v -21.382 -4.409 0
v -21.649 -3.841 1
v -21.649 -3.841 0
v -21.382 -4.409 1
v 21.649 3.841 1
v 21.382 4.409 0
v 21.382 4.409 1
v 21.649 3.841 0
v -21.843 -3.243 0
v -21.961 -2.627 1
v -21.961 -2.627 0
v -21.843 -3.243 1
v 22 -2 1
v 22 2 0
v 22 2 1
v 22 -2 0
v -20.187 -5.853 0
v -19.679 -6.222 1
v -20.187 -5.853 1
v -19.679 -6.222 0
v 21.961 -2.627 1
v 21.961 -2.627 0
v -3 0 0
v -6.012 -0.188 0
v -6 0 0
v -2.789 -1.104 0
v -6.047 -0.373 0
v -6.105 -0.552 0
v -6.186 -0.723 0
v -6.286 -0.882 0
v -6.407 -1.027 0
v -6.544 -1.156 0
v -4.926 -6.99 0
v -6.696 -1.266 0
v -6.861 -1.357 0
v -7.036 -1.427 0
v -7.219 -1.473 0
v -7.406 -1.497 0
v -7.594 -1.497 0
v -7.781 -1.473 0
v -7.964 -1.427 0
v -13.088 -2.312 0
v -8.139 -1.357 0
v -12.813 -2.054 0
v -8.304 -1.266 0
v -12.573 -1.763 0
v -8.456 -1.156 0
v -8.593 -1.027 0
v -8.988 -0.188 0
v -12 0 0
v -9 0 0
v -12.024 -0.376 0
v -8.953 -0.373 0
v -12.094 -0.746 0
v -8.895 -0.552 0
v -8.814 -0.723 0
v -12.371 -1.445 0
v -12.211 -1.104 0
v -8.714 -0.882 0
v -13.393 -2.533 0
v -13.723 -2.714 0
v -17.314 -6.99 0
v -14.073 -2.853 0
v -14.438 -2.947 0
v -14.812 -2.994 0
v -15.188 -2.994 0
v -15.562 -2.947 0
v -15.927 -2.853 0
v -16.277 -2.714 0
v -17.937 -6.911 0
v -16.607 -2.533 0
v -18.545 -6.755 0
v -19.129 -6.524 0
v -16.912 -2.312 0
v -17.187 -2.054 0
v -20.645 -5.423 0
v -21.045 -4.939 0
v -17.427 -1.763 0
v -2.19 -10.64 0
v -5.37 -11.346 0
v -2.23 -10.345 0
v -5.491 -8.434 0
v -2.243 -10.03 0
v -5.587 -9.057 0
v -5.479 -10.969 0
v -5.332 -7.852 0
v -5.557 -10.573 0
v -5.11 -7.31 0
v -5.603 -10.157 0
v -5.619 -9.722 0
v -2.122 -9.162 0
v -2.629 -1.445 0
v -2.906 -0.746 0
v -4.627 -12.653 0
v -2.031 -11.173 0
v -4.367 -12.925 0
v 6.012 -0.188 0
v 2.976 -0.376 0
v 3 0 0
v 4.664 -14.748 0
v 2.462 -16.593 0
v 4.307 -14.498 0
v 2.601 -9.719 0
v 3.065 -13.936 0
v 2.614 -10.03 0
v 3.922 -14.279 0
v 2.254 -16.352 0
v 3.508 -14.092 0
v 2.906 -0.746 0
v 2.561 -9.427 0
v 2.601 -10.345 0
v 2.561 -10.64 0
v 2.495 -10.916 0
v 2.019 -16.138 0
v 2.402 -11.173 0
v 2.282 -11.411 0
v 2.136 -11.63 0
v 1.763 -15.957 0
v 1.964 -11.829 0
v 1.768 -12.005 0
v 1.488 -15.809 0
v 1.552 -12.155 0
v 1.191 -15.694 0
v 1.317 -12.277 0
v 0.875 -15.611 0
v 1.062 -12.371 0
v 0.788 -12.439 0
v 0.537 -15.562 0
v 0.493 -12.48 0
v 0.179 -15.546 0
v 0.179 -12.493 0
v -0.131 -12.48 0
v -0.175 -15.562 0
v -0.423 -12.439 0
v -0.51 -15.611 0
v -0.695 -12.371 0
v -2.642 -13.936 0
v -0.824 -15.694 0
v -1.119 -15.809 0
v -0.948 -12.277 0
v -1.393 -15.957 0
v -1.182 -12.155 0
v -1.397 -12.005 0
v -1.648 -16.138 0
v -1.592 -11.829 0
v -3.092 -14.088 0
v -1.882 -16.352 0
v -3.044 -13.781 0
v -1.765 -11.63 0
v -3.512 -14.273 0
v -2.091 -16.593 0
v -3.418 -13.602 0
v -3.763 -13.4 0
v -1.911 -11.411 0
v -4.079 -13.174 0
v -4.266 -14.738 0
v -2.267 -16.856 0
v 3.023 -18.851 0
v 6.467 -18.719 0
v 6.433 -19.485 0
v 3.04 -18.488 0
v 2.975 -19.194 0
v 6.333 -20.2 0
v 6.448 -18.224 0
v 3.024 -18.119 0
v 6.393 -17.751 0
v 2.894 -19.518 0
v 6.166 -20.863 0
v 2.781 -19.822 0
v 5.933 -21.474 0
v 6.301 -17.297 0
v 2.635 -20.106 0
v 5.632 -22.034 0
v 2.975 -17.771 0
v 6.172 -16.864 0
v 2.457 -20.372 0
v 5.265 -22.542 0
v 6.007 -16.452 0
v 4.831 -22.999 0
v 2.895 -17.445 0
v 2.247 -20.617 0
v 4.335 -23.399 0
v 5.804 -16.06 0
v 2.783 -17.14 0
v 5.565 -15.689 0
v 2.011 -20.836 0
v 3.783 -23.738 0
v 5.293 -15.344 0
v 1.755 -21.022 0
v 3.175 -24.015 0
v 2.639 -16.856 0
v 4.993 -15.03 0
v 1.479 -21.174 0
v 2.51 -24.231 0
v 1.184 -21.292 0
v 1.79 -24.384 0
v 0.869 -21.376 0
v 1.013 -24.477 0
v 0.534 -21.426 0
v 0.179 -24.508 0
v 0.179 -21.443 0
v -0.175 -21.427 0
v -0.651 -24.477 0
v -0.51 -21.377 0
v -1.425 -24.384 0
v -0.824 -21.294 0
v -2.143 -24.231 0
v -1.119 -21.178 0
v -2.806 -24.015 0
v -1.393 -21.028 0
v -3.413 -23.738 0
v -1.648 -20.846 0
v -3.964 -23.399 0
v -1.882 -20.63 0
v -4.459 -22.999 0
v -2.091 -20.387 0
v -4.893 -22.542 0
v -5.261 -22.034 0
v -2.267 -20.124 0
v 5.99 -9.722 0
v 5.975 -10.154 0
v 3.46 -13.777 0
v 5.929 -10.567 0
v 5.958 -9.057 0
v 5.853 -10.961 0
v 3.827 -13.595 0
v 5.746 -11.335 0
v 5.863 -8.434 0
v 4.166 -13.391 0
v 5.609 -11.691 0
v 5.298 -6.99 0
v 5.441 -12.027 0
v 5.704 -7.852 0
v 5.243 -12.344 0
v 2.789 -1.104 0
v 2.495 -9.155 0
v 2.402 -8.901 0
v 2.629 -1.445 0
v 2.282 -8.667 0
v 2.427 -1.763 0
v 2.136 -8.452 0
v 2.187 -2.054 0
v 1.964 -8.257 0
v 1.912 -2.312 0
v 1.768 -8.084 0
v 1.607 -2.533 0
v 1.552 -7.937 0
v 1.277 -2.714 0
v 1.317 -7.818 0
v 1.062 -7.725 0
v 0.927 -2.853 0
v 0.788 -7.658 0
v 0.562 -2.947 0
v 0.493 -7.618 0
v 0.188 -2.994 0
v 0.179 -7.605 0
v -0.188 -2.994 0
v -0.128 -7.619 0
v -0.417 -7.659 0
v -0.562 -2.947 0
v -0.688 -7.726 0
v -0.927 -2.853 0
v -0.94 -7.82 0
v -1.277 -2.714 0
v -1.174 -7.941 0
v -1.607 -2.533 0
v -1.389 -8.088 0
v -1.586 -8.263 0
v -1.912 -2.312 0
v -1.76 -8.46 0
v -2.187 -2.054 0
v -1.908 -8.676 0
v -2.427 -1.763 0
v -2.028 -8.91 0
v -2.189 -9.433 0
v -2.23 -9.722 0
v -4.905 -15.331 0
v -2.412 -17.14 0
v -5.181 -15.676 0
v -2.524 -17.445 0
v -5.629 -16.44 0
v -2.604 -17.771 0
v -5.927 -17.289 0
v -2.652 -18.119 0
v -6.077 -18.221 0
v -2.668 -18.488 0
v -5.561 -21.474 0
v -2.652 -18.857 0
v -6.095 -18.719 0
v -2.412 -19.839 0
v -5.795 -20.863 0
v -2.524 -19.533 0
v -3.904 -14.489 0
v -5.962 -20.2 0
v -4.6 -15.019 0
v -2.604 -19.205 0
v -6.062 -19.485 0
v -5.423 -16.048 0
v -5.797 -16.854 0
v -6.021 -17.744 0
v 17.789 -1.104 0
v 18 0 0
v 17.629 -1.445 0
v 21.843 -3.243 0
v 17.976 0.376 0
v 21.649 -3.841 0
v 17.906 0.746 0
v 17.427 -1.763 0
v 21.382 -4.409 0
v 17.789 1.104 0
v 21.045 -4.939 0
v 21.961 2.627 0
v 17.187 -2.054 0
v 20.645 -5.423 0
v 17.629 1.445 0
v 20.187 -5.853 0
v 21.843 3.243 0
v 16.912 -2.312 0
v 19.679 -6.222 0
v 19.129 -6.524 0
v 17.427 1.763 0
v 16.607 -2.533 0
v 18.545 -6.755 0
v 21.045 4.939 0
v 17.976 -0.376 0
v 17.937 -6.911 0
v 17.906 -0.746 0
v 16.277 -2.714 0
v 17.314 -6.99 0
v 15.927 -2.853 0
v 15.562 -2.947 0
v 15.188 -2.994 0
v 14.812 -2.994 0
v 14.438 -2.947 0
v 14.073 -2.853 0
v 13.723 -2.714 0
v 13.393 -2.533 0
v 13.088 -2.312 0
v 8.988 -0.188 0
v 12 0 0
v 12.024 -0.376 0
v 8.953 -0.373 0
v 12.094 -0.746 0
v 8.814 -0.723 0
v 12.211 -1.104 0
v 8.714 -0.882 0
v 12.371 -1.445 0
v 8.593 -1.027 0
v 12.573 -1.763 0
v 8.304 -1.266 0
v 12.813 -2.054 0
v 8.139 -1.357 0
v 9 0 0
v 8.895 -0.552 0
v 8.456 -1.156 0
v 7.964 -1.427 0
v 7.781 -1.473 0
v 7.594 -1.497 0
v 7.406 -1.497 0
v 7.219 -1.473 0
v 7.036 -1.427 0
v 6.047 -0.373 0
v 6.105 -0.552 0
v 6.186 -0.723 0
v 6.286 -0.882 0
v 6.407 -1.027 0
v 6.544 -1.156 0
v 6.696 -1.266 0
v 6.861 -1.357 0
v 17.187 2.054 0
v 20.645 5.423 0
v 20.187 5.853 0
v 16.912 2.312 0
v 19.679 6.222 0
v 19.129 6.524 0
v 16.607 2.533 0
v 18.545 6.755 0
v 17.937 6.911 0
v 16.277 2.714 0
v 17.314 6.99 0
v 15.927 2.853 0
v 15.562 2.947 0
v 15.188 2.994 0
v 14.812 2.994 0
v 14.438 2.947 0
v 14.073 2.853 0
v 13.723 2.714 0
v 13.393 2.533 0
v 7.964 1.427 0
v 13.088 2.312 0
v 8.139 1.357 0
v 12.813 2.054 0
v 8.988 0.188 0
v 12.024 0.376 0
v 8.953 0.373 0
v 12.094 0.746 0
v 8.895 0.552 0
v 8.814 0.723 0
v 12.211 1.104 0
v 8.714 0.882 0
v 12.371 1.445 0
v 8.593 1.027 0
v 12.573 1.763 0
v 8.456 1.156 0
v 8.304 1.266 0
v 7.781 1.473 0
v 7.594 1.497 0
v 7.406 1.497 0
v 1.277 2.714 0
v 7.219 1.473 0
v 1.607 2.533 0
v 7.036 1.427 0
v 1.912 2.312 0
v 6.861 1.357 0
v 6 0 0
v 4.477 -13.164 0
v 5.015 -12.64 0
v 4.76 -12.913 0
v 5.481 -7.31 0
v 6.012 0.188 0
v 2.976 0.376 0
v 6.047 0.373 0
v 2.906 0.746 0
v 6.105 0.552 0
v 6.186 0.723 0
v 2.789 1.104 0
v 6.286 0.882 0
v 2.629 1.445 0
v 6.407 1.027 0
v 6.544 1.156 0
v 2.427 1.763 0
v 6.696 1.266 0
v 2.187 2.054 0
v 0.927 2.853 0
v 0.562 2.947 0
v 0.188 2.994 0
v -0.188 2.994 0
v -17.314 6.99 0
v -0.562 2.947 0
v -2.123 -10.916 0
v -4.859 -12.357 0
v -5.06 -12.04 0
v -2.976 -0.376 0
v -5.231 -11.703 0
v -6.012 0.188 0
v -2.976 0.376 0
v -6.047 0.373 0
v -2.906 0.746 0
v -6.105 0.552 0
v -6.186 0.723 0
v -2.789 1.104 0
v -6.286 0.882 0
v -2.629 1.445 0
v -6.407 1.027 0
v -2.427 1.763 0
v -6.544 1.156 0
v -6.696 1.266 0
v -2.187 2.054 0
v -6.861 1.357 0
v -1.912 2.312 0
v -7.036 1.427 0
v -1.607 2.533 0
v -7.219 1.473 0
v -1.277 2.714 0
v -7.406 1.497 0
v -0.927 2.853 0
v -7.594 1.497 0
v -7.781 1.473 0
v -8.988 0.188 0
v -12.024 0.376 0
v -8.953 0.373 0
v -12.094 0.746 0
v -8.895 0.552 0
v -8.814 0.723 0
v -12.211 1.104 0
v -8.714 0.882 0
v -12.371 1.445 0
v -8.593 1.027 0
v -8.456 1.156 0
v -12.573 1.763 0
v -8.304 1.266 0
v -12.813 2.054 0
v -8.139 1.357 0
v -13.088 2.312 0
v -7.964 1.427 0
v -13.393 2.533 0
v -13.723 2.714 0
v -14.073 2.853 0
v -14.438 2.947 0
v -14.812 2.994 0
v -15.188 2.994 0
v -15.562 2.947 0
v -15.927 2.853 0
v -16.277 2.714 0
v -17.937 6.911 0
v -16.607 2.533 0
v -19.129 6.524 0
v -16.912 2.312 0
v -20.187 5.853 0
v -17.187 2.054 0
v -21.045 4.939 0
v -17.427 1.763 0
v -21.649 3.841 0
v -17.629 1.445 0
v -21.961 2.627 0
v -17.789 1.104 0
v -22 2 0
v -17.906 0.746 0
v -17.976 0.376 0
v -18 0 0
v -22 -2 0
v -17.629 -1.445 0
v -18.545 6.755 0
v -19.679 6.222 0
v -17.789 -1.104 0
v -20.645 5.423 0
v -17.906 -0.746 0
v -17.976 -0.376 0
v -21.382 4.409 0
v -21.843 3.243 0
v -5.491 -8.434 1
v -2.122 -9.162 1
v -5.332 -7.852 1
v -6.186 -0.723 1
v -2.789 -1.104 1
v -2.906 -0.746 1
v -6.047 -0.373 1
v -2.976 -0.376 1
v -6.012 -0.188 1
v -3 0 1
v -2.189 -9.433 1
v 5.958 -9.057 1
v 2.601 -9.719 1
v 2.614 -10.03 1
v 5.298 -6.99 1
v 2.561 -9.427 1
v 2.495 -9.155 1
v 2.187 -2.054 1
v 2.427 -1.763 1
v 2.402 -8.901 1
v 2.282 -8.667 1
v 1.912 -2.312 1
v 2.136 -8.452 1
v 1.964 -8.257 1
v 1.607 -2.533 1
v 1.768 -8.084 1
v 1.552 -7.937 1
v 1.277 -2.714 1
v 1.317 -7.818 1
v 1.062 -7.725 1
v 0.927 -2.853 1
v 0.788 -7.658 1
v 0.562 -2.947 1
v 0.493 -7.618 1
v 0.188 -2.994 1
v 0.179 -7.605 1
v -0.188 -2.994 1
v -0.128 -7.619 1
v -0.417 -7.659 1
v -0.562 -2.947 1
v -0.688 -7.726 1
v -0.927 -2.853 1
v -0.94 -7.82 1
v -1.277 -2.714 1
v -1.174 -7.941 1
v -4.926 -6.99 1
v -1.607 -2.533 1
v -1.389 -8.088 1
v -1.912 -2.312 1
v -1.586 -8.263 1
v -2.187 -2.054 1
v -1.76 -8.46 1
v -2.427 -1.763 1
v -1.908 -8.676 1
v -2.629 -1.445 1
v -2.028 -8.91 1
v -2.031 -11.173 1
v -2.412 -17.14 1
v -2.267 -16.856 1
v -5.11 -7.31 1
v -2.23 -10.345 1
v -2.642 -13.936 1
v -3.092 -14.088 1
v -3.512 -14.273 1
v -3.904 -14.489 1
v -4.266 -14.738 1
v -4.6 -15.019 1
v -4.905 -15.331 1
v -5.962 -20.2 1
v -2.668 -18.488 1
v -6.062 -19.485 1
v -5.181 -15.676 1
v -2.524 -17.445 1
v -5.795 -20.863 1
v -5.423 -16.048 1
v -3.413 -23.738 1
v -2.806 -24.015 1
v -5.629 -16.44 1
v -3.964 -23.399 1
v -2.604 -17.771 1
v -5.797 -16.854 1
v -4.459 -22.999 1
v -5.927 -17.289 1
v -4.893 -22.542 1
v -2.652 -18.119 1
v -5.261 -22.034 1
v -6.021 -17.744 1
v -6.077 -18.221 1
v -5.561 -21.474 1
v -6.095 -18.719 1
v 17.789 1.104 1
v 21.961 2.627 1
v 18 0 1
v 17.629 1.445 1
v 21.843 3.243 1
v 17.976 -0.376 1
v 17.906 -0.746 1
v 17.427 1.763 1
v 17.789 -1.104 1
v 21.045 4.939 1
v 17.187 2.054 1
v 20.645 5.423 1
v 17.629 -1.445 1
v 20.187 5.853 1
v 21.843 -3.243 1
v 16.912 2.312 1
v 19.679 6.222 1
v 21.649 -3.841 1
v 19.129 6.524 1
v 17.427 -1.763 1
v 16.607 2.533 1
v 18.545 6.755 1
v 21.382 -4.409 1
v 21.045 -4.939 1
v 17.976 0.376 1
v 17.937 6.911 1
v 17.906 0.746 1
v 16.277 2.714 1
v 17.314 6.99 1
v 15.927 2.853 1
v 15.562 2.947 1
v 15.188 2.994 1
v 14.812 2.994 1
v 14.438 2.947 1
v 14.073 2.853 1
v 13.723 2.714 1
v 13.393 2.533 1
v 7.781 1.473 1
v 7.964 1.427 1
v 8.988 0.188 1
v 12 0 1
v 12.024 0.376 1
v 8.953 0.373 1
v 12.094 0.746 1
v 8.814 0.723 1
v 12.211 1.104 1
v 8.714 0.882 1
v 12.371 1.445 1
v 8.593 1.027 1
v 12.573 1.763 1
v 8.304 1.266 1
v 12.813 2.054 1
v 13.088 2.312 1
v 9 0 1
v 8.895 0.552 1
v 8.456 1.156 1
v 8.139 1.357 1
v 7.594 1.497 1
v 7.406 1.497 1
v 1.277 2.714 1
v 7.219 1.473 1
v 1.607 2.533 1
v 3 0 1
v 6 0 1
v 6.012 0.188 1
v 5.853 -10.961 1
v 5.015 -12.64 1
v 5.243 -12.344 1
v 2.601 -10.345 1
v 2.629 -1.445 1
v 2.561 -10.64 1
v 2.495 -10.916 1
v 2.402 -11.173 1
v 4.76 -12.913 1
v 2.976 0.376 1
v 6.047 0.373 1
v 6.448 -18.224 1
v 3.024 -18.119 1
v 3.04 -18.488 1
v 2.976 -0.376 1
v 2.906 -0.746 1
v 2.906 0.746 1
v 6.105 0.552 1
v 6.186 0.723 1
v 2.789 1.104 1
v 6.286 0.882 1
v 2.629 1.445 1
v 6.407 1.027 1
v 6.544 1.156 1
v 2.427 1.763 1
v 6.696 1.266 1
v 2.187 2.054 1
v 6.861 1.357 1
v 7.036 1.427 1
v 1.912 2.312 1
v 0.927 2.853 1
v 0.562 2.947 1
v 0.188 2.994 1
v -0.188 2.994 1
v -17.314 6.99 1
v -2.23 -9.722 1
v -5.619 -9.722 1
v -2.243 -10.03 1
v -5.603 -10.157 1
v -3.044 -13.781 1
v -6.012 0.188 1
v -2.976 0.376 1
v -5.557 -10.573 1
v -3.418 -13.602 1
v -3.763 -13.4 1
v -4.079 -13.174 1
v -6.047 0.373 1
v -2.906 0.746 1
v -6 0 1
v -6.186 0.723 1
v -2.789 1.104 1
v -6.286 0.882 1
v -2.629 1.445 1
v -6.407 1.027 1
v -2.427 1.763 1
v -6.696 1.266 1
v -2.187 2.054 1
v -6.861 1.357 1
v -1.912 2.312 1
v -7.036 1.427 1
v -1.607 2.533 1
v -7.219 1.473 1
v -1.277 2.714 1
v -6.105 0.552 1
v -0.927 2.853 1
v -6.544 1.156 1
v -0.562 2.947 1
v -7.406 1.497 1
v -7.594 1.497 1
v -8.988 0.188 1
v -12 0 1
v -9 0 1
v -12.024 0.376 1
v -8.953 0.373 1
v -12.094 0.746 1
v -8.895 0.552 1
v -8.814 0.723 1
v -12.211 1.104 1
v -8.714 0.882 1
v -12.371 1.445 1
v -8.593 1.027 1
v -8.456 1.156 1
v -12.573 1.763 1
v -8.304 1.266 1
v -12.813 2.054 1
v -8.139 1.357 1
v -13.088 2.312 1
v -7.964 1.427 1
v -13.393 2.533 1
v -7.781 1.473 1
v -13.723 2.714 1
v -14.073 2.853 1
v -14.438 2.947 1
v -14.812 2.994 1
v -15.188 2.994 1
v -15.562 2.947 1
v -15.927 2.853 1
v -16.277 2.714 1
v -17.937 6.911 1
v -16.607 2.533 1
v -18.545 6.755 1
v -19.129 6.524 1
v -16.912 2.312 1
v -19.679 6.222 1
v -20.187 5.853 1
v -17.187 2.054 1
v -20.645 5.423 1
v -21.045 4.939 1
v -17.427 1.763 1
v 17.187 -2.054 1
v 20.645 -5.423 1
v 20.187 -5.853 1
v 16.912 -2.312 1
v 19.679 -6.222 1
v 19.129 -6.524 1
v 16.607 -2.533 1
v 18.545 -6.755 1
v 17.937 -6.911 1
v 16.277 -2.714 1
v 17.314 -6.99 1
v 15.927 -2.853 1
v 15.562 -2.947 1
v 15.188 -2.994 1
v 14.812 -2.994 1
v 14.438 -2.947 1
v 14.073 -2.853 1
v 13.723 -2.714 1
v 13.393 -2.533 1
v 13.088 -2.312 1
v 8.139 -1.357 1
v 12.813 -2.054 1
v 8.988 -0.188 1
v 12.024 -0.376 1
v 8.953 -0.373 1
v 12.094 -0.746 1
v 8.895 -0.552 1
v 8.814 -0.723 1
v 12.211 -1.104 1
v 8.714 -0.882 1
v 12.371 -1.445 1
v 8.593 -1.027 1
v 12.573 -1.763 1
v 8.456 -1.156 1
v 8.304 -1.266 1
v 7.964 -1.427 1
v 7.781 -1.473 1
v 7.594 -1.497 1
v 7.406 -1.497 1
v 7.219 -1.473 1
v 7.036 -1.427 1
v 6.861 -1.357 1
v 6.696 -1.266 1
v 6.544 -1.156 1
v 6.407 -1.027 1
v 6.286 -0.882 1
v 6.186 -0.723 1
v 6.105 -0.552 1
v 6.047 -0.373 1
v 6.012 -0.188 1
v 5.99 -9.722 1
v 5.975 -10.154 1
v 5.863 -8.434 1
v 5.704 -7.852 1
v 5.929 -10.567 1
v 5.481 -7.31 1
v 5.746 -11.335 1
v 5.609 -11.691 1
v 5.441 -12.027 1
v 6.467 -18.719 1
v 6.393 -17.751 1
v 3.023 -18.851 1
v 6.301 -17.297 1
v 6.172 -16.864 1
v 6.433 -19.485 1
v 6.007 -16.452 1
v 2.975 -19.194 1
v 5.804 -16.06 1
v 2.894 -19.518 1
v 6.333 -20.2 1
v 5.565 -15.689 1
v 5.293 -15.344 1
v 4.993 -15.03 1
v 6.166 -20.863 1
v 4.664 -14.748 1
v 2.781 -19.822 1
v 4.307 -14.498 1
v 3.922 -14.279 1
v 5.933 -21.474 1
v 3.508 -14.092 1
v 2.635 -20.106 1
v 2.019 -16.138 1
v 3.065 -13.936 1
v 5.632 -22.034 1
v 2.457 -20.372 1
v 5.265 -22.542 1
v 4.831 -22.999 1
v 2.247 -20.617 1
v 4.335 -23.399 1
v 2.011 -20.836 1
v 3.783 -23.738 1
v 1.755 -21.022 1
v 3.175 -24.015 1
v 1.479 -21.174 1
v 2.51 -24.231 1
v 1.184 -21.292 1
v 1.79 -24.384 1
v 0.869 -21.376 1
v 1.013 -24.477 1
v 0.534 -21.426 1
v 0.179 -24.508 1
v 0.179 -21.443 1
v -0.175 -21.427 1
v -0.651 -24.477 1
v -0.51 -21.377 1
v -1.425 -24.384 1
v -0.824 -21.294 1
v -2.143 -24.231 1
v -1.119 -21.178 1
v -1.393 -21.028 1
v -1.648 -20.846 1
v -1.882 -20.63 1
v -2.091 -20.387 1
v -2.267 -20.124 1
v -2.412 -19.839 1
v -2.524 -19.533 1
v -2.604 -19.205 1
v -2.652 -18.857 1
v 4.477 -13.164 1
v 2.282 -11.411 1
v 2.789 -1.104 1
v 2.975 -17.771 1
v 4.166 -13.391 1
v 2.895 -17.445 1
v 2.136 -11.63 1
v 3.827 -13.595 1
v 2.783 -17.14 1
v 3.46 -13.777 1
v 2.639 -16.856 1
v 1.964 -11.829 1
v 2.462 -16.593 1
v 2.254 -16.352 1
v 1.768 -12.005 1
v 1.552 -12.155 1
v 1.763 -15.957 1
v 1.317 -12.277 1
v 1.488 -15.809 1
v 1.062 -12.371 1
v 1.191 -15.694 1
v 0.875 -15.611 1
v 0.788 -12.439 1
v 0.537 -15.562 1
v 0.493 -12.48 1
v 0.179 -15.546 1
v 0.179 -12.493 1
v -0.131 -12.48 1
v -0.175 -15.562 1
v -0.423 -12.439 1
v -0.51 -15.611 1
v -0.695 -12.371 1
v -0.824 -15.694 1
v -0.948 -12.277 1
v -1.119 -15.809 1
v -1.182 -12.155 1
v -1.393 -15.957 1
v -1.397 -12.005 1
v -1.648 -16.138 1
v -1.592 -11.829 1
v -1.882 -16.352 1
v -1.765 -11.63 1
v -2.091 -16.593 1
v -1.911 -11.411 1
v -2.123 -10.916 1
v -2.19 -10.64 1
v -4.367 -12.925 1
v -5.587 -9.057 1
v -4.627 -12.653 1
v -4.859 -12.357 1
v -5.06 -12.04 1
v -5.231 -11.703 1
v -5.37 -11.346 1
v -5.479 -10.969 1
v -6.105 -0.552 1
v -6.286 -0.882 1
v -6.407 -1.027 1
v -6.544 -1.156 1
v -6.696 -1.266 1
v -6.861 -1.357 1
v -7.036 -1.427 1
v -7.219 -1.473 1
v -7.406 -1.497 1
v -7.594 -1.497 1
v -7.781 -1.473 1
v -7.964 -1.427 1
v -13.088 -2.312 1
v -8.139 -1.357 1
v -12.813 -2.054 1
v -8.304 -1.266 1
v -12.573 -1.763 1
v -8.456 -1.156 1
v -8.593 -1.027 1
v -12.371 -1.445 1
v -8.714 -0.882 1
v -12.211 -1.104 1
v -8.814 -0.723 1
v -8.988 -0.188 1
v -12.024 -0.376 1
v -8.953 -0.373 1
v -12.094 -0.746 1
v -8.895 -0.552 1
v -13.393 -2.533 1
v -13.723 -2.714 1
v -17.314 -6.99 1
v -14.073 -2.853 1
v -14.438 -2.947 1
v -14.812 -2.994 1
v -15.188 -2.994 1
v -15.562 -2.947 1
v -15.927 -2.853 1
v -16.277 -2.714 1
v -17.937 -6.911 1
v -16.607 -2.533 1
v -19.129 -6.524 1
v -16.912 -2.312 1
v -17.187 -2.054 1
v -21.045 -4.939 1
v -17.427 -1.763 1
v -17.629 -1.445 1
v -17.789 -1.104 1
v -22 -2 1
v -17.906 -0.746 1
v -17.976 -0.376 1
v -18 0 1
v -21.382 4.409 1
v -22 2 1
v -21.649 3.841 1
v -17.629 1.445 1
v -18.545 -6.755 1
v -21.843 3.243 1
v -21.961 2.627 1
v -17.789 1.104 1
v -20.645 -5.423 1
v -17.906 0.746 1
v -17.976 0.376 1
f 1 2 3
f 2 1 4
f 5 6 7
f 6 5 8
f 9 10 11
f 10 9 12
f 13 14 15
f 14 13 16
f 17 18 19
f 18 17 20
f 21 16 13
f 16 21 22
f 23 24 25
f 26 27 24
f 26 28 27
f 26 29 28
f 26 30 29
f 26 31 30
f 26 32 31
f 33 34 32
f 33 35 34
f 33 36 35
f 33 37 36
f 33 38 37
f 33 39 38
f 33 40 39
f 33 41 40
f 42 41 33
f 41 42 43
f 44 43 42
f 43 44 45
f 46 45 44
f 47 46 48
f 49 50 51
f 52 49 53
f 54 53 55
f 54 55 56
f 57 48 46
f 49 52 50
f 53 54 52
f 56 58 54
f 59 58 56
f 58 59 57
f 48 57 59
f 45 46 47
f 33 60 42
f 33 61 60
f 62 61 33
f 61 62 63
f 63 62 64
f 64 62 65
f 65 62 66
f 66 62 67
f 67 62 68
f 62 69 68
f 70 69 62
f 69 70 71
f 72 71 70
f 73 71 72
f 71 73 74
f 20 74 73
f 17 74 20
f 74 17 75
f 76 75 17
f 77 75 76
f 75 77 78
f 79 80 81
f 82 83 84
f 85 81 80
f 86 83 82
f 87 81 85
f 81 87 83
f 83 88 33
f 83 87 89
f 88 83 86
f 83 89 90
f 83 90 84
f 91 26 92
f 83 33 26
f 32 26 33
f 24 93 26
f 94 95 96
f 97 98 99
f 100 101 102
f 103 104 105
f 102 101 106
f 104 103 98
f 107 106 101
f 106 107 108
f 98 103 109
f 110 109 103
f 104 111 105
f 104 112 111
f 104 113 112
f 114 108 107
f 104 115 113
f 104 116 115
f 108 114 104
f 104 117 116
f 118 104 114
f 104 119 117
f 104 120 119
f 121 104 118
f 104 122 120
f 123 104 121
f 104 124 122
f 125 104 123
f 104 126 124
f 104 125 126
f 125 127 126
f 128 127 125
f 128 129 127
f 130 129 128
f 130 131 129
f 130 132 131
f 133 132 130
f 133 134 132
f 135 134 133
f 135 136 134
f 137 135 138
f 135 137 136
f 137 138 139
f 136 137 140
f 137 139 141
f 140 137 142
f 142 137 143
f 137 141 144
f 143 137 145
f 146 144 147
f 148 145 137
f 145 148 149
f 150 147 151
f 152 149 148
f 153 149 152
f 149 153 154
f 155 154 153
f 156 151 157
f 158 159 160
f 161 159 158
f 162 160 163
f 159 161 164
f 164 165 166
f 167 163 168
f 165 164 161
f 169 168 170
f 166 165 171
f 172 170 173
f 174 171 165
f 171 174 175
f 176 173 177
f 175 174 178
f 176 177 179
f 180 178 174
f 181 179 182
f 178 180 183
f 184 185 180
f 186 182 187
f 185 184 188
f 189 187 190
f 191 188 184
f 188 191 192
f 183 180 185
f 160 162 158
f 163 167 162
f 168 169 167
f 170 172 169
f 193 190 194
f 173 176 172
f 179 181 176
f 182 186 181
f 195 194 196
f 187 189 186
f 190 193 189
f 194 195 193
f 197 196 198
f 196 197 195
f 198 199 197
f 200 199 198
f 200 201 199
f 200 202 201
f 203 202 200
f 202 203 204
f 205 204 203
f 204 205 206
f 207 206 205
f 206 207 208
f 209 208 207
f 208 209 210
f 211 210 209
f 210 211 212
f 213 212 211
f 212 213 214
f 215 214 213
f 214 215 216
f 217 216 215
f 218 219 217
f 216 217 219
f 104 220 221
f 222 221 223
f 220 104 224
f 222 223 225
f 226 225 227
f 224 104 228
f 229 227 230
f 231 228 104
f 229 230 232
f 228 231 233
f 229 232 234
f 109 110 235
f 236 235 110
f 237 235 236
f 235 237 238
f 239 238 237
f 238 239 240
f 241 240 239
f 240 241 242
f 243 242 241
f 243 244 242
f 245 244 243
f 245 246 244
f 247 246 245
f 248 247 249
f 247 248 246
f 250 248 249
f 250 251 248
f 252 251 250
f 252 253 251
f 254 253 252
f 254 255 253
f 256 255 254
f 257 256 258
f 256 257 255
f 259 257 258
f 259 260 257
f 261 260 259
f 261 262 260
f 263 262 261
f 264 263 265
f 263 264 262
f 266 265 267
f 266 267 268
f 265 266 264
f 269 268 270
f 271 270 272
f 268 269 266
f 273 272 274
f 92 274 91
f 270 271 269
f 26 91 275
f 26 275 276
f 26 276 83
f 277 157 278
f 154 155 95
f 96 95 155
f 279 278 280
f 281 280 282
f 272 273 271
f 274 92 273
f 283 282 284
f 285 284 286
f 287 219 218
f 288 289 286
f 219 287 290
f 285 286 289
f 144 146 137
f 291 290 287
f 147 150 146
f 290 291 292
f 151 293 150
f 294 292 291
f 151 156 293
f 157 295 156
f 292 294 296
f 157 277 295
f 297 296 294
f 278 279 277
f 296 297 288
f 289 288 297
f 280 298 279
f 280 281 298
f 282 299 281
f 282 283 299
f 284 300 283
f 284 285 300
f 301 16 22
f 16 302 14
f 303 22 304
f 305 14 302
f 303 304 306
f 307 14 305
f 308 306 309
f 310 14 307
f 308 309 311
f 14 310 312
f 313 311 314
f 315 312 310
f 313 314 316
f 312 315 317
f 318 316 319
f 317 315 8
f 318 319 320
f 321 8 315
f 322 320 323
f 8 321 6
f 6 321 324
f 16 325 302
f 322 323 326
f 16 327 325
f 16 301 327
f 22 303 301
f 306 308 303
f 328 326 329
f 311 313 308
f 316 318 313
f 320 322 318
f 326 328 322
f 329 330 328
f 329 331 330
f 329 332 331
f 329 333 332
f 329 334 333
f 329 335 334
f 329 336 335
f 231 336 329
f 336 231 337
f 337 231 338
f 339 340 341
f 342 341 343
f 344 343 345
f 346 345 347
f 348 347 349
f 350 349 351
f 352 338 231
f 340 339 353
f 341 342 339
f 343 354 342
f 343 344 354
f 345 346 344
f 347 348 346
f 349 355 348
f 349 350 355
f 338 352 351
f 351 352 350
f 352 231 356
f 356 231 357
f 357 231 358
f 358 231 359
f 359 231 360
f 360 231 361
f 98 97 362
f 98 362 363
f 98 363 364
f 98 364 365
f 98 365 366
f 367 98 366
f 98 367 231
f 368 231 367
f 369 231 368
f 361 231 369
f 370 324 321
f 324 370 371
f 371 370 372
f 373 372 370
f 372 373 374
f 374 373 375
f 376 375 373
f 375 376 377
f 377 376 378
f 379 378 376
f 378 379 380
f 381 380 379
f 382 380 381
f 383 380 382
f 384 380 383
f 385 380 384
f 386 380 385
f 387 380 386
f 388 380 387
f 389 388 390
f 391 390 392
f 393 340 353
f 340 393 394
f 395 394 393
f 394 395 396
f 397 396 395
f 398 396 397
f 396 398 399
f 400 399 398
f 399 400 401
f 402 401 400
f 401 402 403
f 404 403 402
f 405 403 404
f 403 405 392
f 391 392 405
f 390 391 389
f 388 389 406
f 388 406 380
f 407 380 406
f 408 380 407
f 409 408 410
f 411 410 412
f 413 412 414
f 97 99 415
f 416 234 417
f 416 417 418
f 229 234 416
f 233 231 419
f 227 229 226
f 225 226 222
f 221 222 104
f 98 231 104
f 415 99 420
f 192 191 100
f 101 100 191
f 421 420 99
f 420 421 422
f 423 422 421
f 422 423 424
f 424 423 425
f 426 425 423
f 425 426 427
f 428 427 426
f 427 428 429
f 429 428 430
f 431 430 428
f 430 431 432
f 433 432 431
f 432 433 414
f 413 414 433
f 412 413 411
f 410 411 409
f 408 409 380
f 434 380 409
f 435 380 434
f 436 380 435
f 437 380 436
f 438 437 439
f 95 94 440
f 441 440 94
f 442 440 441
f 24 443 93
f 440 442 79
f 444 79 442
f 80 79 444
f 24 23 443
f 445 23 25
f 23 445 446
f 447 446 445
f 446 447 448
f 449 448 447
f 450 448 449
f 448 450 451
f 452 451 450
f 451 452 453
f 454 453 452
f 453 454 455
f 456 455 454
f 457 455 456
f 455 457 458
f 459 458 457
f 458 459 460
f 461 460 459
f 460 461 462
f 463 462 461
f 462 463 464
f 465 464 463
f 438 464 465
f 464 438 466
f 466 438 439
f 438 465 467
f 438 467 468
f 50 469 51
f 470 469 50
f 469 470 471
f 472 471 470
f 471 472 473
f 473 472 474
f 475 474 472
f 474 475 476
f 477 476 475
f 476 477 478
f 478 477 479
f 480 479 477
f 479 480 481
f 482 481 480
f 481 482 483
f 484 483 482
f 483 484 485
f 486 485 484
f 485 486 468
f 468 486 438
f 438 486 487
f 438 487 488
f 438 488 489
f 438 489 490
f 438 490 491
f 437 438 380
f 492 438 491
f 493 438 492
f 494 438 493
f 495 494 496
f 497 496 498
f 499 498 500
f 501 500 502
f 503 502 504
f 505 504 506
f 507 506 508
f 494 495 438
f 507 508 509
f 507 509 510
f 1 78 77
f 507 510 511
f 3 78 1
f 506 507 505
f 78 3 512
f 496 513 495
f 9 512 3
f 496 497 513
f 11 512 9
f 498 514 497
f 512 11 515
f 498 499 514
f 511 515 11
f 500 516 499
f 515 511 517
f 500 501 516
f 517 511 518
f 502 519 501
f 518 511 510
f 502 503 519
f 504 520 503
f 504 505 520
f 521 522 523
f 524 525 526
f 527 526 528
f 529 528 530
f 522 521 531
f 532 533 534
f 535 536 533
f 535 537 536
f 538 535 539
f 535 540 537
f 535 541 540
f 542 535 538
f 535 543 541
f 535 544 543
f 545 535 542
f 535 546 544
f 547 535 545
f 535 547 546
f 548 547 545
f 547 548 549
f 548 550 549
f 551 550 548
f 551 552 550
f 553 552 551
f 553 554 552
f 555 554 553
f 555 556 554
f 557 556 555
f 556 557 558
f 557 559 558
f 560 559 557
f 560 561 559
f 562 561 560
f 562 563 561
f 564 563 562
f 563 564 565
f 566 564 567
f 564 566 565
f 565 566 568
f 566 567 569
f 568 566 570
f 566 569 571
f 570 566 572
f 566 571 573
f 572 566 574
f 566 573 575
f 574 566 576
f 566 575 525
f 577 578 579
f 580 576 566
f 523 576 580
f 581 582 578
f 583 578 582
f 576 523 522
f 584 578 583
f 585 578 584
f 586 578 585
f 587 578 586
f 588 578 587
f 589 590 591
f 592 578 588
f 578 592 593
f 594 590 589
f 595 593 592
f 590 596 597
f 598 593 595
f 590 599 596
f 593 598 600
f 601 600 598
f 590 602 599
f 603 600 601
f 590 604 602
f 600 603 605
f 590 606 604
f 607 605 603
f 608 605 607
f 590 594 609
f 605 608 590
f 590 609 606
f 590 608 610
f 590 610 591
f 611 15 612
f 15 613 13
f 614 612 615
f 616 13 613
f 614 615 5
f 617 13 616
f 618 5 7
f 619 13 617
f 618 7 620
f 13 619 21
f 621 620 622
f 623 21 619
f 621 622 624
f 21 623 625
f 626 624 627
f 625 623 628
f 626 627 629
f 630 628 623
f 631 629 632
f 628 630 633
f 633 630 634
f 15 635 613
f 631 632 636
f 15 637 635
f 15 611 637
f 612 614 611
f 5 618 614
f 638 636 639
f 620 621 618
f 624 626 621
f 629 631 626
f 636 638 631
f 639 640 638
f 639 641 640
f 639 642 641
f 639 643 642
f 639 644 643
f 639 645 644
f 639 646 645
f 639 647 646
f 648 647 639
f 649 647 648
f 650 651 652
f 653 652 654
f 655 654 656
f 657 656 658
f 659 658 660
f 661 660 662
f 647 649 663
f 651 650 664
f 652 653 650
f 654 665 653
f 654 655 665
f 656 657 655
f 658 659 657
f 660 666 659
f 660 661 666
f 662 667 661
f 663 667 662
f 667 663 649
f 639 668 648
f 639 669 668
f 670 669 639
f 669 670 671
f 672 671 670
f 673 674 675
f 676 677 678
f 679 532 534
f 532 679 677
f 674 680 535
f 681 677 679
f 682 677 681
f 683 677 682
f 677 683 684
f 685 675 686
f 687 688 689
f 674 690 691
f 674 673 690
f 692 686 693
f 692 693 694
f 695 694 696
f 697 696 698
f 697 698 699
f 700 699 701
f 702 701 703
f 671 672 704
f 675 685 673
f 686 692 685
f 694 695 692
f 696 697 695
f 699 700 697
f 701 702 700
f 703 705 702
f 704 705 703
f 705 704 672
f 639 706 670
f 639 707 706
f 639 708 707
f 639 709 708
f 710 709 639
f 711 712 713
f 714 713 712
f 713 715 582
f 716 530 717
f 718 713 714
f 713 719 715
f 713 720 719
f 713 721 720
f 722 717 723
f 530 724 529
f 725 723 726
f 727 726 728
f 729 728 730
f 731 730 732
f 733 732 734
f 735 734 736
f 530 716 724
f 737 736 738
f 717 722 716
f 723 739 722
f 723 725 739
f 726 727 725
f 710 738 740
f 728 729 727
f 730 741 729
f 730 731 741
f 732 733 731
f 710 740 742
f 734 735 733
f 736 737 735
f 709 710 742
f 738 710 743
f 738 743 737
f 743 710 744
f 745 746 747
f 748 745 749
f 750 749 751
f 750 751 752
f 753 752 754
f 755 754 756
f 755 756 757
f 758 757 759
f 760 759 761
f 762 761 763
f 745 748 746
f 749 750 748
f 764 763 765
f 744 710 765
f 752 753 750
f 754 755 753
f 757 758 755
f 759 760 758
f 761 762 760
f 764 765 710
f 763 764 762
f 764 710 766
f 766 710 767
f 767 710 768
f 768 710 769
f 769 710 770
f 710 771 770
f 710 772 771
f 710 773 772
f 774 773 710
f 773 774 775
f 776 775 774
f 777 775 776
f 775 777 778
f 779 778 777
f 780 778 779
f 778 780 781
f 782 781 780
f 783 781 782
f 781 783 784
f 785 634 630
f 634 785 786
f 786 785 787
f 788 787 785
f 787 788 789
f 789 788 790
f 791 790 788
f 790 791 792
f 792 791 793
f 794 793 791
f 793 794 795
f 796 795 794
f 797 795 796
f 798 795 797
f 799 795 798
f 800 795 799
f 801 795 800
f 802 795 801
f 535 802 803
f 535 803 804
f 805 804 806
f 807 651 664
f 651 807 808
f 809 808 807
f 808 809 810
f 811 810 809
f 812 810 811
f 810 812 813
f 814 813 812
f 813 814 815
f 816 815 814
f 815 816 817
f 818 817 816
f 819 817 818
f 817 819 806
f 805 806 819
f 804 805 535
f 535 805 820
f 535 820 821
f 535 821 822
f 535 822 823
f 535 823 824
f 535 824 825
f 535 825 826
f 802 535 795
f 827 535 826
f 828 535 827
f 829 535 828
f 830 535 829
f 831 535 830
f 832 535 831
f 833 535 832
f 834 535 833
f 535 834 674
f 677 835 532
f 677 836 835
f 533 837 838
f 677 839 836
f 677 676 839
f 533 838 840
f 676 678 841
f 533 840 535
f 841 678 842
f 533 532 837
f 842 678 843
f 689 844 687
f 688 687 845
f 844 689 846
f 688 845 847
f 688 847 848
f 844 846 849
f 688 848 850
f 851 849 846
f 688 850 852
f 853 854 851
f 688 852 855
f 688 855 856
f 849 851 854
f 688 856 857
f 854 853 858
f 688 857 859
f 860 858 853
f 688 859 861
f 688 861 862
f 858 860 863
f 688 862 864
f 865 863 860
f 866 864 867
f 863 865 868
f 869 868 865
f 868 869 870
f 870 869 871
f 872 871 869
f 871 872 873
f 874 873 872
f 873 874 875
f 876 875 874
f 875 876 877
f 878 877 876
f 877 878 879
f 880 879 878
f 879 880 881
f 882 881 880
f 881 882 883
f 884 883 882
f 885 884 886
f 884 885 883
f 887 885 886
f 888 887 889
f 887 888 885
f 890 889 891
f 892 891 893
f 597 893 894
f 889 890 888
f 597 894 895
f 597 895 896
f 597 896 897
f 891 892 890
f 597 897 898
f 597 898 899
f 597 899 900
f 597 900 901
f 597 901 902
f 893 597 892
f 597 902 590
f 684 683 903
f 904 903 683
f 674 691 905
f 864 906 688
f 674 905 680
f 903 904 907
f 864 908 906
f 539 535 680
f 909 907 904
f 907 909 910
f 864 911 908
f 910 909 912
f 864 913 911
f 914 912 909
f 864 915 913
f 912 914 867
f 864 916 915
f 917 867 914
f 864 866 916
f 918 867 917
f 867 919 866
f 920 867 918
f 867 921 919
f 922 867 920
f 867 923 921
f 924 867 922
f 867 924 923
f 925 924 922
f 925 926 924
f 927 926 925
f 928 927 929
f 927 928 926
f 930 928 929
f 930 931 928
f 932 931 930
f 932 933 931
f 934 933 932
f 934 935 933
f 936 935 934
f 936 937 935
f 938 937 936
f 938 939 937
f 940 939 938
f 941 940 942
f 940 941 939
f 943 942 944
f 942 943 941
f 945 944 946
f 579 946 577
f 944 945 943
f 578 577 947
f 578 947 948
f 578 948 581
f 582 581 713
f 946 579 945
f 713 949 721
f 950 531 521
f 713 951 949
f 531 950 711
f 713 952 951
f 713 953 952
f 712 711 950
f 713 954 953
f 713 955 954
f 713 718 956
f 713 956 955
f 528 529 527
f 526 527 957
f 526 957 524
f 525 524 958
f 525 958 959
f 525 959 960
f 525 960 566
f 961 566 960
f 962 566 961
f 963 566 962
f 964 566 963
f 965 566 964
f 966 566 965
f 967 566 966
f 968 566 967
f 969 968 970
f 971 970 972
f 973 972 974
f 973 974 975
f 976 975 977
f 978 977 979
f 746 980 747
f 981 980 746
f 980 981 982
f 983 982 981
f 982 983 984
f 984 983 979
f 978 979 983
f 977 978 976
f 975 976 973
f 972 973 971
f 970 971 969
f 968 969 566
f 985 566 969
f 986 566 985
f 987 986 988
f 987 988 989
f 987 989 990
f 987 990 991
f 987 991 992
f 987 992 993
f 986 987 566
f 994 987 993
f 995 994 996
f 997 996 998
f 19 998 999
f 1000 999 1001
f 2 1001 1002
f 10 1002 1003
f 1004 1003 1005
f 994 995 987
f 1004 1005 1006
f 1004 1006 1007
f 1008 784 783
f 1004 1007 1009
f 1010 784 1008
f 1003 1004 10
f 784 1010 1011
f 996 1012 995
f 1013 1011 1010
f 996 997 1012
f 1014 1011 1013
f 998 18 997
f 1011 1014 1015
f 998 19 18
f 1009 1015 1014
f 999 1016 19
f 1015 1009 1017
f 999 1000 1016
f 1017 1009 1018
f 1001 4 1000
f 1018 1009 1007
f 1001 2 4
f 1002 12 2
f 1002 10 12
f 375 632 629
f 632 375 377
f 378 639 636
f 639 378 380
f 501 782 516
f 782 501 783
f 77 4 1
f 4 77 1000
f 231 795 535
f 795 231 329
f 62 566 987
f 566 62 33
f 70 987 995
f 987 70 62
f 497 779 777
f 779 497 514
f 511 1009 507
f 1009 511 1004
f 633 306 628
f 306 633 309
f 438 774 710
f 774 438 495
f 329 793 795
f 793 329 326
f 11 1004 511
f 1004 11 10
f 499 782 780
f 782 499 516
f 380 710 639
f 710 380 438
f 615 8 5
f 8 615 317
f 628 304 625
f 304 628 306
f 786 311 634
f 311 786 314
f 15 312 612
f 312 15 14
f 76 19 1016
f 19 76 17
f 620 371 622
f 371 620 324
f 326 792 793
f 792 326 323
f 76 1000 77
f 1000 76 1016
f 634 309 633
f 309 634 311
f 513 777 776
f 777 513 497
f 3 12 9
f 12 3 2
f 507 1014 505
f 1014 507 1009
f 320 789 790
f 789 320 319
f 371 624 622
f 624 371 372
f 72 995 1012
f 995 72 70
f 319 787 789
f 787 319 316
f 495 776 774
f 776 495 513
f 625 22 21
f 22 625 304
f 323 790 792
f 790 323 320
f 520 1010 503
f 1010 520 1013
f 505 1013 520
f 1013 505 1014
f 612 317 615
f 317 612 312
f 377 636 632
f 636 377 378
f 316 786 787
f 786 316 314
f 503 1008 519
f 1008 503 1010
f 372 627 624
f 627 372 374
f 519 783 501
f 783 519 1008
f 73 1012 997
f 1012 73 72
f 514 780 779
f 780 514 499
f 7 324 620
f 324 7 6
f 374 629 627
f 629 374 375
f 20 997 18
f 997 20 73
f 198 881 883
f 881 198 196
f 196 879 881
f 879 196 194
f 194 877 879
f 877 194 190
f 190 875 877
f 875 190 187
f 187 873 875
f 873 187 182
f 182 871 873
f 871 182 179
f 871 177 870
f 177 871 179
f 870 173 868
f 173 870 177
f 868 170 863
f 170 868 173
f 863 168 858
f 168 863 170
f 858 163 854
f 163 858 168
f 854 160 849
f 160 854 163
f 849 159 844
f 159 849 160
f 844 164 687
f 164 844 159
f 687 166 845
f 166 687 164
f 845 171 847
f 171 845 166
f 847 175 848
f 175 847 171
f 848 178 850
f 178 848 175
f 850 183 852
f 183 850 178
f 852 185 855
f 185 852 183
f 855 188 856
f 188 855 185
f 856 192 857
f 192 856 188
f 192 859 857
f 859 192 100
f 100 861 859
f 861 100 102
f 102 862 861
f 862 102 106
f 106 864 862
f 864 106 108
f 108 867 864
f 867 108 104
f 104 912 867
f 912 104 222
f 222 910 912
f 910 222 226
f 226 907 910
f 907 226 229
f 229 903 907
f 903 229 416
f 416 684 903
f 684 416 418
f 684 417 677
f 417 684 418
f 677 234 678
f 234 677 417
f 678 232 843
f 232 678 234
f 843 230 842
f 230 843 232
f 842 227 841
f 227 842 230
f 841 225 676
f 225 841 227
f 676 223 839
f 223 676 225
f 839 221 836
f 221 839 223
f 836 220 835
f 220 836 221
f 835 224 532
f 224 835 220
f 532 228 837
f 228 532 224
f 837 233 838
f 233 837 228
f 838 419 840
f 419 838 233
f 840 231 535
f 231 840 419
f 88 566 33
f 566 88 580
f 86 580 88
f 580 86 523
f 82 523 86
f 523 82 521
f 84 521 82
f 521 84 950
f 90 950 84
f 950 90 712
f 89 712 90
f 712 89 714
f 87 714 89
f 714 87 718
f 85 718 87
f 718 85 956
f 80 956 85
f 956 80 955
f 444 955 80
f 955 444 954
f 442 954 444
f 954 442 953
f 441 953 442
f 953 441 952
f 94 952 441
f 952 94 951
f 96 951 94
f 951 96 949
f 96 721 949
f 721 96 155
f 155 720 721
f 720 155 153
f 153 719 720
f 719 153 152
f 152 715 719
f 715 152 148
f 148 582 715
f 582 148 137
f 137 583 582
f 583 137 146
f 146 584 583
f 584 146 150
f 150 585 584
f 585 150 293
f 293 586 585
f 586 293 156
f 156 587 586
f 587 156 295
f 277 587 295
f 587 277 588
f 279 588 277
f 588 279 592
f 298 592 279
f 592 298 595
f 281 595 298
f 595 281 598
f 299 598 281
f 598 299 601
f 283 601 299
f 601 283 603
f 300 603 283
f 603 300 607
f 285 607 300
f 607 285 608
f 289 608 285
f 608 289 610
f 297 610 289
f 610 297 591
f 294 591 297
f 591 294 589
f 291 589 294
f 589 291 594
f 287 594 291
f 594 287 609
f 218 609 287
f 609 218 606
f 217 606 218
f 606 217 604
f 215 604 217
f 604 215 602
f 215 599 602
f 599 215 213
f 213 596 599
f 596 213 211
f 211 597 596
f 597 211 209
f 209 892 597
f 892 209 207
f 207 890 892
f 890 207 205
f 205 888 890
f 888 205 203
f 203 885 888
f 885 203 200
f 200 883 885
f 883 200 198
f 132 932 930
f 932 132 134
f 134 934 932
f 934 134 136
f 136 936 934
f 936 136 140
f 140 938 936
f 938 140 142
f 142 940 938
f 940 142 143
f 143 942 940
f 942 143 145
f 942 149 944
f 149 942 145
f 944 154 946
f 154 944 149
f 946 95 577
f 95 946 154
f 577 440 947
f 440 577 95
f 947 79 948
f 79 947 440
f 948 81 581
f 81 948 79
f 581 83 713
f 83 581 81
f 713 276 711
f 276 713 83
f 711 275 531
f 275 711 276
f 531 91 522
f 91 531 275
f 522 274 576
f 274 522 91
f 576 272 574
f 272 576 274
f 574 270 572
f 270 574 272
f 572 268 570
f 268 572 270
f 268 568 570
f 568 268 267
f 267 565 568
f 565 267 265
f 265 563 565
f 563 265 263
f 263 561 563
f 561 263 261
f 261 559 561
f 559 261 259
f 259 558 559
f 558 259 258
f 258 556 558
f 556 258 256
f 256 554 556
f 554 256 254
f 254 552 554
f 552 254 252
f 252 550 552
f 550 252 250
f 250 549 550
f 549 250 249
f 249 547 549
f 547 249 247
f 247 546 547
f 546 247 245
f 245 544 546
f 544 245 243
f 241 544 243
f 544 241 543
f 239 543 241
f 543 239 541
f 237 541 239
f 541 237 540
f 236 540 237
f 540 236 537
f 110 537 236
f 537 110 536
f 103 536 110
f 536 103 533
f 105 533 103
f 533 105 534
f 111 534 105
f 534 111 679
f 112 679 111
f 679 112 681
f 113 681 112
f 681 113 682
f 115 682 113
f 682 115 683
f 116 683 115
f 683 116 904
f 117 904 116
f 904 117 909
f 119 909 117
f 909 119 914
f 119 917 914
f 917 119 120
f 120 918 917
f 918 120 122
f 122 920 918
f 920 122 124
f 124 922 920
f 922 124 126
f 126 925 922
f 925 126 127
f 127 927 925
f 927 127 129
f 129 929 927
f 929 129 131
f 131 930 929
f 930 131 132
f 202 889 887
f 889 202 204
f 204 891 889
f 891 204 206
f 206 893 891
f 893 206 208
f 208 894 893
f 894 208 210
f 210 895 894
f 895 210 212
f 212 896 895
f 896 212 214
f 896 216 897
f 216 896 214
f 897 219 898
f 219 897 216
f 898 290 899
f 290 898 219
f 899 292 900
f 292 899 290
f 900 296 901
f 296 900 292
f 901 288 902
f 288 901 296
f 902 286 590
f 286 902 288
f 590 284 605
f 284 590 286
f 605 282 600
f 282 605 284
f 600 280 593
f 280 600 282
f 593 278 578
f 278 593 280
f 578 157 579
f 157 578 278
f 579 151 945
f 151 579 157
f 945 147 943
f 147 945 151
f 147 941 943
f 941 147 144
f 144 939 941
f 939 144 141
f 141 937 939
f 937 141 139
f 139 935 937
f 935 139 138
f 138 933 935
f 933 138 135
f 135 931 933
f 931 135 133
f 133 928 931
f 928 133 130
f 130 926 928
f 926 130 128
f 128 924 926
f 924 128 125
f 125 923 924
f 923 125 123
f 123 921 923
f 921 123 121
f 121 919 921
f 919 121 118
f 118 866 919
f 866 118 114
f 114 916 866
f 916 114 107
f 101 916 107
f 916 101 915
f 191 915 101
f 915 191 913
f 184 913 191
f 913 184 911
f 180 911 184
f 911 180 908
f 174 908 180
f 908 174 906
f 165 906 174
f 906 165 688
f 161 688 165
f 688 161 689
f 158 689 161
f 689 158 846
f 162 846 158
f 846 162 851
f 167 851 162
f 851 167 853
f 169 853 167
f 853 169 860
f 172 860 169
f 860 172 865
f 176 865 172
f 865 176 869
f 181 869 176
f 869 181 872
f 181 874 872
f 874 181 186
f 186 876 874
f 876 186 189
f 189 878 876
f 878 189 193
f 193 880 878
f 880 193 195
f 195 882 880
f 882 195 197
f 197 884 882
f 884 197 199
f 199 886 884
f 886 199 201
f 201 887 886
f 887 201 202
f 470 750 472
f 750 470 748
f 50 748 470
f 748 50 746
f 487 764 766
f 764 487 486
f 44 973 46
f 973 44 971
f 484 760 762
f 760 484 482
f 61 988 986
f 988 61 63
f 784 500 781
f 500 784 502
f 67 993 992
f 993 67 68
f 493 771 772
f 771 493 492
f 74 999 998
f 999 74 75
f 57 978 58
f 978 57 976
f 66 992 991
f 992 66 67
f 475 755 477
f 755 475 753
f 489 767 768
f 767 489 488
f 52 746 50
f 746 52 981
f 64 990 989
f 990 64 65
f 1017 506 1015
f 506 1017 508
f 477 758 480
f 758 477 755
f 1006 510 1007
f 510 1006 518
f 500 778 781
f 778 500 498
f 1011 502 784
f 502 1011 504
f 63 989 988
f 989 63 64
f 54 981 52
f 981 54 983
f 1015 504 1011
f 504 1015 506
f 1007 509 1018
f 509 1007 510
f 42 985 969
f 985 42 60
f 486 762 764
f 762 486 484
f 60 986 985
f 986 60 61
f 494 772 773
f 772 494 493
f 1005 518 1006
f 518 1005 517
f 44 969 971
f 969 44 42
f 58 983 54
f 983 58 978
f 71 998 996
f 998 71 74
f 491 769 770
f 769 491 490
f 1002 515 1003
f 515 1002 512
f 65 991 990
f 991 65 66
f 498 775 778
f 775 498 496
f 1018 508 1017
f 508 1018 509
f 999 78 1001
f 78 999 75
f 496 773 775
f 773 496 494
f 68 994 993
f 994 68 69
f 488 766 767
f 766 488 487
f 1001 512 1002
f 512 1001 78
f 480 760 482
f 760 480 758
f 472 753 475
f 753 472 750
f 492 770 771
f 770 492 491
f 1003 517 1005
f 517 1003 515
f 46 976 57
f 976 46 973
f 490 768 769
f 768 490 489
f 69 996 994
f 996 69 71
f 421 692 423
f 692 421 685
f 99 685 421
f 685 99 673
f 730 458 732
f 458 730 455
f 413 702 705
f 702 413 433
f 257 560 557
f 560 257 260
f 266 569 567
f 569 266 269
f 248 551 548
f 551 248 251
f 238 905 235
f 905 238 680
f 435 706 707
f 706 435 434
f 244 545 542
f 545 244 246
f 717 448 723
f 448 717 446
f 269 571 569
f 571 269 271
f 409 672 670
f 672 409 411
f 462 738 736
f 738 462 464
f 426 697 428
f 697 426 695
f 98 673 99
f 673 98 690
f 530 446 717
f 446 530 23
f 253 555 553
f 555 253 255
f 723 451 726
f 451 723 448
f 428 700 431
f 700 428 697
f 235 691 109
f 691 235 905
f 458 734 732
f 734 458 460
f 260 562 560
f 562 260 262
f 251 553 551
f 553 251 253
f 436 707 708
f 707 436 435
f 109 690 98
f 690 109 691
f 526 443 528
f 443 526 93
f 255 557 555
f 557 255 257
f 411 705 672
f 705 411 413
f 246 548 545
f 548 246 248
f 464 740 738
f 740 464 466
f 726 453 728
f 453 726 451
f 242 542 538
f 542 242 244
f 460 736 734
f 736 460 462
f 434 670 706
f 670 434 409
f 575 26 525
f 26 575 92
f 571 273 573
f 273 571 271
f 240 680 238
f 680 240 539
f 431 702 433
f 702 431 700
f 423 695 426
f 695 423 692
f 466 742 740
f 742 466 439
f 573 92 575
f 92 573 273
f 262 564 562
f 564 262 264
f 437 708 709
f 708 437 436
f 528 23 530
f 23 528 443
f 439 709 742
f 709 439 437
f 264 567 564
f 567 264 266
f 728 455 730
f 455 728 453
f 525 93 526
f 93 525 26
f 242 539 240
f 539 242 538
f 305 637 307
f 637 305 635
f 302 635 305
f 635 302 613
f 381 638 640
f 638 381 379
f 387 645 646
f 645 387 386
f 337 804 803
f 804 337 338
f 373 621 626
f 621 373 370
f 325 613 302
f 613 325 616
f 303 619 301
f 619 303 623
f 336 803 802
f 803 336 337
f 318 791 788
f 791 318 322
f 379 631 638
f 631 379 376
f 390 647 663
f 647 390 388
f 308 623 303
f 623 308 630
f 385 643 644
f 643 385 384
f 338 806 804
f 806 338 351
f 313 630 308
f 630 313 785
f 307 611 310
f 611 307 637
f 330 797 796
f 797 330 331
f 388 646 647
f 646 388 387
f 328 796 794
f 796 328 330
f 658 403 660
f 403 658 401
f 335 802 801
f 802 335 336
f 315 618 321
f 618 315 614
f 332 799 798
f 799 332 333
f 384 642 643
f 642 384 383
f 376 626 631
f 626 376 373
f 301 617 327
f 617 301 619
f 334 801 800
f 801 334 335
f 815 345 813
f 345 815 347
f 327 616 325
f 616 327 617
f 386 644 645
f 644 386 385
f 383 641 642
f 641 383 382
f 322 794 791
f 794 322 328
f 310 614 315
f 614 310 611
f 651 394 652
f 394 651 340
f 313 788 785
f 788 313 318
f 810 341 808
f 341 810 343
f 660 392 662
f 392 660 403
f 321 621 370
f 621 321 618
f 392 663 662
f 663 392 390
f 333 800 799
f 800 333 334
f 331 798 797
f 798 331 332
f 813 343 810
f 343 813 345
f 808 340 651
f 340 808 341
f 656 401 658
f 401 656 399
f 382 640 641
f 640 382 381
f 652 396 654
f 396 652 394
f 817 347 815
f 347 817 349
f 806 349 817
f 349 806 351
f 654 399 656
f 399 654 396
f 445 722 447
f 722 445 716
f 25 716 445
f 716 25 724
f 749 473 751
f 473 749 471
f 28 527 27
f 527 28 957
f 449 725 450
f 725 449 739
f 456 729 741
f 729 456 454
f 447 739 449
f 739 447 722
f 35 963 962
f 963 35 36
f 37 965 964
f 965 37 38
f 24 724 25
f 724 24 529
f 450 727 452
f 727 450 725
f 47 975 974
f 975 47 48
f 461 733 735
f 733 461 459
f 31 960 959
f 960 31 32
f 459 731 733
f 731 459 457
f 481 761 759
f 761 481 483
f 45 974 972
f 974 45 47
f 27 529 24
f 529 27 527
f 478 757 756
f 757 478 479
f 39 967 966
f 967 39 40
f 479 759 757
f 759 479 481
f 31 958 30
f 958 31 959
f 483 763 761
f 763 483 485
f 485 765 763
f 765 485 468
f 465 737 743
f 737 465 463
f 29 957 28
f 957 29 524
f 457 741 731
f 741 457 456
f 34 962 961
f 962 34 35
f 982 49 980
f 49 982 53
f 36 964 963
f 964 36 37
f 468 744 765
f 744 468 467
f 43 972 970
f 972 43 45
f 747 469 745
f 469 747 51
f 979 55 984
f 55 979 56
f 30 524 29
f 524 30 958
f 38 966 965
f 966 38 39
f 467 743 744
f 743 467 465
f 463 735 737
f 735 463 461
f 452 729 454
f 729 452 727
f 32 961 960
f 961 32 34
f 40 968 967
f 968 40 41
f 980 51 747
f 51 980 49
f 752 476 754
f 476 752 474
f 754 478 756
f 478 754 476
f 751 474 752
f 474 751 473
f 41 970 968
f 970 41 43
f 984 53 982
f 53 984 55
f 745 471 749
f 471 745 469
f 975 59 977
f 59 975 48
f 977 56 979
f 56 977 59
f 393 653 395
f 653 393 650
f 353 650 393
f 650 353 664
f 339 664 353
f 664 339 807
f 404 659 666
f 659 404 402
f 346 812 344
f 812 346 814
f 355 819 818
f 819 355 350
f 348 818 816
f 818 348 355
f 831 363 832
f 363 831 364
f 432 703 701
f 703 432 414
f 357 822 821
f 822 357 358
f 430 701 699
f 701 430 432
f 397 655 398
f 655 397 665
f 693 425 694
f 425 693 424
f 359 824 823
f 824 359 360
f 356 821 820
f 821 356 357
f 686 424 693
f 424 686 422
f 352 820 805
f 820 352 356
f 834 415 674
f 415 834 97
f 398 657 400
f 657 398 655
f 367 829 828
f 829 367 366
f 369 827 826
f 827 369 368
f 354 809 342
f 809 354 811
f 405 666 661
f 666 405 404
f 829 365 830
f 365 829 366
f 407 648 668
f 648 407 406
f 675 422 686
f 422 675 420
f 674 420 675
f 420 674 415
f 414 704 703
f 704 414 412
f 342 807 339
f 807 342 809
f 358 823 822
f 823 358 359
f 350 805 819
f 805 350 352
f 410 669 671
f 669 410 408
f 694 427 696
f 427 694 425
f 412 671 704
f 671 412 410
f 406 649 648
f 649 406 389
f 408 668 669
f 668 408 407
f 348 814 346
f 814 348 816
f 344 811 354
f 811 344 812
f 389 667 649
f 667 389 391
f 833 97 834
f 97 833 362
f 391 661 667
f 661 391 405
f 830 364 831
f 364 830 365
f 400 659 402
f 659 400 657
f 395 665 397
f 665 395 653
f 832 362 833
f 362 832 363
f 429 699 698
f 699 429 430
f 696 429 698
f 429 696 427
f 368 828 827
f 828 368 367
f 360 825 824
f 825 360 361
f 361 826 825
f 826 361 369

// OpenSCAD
$fn = 50;


difference() {
	union() {
		hull() {
			translate(v = [-17.0000000000, 2.0000000000, 0]) {
				cylinder(h = 1, r = 5);
			}
			translate(v = [17.0000000000, 2.0000000000, 0]) {
				cylinder(h = 1, r = 5);
			}
			translate(v = [-17.0000000000, -2.0000000000, 0]) {
				cylinder(h = 1, r = 5);
			}
			translate(v = [17.0000000000, -2.0000000000, 0]) {
				cylinder(h = 1, r = 5);
			}
		}
		translate(v = [0, -5, 0]) {
			linear_extrude(height = 1) {
				text(font = "DejaVu Sans Mono:style=Bold", halign = "center", size = 19.0000000000, text = "8", valign = "top");
			}
		}
	}
	union() {
		translate(v = [-15.0000000000, 0.0000000000, 0]) {
			translate(v = [0, 0, -100]) {
				cylinder(h = 200, r = 3.0000000000);
			}
		}
		translate(v = [0, 0, -100]) {
			cylinder(h = 200, r = 3.0000000000);
		}
		translate(v = [15.0000000000, 0.0000000000, 0]) {
			translate(v = [0, 0, -100]) {
				cylinder(h = 200, r = 3.0000000000);
			}
		}
		translate(v = [-15.0000000000, 0.0000000000, 0]) {
			translate(v = [0, 0, -100]) {
				cylinder(h = 200, r = 1.5000000000);
			}
		}
		translate(v = [-7.5000000000, 0.0000000000, 0]) {
			translate(v = [0, 0, -100]) {
				cylinder(h = 200, r = 1.5000000000);
			}
		}
		translate(v = [0, 0, -100]) {
			cylinder(h = 200, r = 1.5000000000);
		}
		translate(v = [7.5000000000, 0.0000000000, 0]) {
			translate(v = [0, 0, -100]) {
				cylinder(h = 200, r = 1.5000000000);
			}
		}
		translate(v = [15.0000000000, 0.0000000000, 0]) {
			translate(v = [0, 0, -100]) {
				cylinder(h = 200, r = 1.5000000000);
			}
		}
	}
}
